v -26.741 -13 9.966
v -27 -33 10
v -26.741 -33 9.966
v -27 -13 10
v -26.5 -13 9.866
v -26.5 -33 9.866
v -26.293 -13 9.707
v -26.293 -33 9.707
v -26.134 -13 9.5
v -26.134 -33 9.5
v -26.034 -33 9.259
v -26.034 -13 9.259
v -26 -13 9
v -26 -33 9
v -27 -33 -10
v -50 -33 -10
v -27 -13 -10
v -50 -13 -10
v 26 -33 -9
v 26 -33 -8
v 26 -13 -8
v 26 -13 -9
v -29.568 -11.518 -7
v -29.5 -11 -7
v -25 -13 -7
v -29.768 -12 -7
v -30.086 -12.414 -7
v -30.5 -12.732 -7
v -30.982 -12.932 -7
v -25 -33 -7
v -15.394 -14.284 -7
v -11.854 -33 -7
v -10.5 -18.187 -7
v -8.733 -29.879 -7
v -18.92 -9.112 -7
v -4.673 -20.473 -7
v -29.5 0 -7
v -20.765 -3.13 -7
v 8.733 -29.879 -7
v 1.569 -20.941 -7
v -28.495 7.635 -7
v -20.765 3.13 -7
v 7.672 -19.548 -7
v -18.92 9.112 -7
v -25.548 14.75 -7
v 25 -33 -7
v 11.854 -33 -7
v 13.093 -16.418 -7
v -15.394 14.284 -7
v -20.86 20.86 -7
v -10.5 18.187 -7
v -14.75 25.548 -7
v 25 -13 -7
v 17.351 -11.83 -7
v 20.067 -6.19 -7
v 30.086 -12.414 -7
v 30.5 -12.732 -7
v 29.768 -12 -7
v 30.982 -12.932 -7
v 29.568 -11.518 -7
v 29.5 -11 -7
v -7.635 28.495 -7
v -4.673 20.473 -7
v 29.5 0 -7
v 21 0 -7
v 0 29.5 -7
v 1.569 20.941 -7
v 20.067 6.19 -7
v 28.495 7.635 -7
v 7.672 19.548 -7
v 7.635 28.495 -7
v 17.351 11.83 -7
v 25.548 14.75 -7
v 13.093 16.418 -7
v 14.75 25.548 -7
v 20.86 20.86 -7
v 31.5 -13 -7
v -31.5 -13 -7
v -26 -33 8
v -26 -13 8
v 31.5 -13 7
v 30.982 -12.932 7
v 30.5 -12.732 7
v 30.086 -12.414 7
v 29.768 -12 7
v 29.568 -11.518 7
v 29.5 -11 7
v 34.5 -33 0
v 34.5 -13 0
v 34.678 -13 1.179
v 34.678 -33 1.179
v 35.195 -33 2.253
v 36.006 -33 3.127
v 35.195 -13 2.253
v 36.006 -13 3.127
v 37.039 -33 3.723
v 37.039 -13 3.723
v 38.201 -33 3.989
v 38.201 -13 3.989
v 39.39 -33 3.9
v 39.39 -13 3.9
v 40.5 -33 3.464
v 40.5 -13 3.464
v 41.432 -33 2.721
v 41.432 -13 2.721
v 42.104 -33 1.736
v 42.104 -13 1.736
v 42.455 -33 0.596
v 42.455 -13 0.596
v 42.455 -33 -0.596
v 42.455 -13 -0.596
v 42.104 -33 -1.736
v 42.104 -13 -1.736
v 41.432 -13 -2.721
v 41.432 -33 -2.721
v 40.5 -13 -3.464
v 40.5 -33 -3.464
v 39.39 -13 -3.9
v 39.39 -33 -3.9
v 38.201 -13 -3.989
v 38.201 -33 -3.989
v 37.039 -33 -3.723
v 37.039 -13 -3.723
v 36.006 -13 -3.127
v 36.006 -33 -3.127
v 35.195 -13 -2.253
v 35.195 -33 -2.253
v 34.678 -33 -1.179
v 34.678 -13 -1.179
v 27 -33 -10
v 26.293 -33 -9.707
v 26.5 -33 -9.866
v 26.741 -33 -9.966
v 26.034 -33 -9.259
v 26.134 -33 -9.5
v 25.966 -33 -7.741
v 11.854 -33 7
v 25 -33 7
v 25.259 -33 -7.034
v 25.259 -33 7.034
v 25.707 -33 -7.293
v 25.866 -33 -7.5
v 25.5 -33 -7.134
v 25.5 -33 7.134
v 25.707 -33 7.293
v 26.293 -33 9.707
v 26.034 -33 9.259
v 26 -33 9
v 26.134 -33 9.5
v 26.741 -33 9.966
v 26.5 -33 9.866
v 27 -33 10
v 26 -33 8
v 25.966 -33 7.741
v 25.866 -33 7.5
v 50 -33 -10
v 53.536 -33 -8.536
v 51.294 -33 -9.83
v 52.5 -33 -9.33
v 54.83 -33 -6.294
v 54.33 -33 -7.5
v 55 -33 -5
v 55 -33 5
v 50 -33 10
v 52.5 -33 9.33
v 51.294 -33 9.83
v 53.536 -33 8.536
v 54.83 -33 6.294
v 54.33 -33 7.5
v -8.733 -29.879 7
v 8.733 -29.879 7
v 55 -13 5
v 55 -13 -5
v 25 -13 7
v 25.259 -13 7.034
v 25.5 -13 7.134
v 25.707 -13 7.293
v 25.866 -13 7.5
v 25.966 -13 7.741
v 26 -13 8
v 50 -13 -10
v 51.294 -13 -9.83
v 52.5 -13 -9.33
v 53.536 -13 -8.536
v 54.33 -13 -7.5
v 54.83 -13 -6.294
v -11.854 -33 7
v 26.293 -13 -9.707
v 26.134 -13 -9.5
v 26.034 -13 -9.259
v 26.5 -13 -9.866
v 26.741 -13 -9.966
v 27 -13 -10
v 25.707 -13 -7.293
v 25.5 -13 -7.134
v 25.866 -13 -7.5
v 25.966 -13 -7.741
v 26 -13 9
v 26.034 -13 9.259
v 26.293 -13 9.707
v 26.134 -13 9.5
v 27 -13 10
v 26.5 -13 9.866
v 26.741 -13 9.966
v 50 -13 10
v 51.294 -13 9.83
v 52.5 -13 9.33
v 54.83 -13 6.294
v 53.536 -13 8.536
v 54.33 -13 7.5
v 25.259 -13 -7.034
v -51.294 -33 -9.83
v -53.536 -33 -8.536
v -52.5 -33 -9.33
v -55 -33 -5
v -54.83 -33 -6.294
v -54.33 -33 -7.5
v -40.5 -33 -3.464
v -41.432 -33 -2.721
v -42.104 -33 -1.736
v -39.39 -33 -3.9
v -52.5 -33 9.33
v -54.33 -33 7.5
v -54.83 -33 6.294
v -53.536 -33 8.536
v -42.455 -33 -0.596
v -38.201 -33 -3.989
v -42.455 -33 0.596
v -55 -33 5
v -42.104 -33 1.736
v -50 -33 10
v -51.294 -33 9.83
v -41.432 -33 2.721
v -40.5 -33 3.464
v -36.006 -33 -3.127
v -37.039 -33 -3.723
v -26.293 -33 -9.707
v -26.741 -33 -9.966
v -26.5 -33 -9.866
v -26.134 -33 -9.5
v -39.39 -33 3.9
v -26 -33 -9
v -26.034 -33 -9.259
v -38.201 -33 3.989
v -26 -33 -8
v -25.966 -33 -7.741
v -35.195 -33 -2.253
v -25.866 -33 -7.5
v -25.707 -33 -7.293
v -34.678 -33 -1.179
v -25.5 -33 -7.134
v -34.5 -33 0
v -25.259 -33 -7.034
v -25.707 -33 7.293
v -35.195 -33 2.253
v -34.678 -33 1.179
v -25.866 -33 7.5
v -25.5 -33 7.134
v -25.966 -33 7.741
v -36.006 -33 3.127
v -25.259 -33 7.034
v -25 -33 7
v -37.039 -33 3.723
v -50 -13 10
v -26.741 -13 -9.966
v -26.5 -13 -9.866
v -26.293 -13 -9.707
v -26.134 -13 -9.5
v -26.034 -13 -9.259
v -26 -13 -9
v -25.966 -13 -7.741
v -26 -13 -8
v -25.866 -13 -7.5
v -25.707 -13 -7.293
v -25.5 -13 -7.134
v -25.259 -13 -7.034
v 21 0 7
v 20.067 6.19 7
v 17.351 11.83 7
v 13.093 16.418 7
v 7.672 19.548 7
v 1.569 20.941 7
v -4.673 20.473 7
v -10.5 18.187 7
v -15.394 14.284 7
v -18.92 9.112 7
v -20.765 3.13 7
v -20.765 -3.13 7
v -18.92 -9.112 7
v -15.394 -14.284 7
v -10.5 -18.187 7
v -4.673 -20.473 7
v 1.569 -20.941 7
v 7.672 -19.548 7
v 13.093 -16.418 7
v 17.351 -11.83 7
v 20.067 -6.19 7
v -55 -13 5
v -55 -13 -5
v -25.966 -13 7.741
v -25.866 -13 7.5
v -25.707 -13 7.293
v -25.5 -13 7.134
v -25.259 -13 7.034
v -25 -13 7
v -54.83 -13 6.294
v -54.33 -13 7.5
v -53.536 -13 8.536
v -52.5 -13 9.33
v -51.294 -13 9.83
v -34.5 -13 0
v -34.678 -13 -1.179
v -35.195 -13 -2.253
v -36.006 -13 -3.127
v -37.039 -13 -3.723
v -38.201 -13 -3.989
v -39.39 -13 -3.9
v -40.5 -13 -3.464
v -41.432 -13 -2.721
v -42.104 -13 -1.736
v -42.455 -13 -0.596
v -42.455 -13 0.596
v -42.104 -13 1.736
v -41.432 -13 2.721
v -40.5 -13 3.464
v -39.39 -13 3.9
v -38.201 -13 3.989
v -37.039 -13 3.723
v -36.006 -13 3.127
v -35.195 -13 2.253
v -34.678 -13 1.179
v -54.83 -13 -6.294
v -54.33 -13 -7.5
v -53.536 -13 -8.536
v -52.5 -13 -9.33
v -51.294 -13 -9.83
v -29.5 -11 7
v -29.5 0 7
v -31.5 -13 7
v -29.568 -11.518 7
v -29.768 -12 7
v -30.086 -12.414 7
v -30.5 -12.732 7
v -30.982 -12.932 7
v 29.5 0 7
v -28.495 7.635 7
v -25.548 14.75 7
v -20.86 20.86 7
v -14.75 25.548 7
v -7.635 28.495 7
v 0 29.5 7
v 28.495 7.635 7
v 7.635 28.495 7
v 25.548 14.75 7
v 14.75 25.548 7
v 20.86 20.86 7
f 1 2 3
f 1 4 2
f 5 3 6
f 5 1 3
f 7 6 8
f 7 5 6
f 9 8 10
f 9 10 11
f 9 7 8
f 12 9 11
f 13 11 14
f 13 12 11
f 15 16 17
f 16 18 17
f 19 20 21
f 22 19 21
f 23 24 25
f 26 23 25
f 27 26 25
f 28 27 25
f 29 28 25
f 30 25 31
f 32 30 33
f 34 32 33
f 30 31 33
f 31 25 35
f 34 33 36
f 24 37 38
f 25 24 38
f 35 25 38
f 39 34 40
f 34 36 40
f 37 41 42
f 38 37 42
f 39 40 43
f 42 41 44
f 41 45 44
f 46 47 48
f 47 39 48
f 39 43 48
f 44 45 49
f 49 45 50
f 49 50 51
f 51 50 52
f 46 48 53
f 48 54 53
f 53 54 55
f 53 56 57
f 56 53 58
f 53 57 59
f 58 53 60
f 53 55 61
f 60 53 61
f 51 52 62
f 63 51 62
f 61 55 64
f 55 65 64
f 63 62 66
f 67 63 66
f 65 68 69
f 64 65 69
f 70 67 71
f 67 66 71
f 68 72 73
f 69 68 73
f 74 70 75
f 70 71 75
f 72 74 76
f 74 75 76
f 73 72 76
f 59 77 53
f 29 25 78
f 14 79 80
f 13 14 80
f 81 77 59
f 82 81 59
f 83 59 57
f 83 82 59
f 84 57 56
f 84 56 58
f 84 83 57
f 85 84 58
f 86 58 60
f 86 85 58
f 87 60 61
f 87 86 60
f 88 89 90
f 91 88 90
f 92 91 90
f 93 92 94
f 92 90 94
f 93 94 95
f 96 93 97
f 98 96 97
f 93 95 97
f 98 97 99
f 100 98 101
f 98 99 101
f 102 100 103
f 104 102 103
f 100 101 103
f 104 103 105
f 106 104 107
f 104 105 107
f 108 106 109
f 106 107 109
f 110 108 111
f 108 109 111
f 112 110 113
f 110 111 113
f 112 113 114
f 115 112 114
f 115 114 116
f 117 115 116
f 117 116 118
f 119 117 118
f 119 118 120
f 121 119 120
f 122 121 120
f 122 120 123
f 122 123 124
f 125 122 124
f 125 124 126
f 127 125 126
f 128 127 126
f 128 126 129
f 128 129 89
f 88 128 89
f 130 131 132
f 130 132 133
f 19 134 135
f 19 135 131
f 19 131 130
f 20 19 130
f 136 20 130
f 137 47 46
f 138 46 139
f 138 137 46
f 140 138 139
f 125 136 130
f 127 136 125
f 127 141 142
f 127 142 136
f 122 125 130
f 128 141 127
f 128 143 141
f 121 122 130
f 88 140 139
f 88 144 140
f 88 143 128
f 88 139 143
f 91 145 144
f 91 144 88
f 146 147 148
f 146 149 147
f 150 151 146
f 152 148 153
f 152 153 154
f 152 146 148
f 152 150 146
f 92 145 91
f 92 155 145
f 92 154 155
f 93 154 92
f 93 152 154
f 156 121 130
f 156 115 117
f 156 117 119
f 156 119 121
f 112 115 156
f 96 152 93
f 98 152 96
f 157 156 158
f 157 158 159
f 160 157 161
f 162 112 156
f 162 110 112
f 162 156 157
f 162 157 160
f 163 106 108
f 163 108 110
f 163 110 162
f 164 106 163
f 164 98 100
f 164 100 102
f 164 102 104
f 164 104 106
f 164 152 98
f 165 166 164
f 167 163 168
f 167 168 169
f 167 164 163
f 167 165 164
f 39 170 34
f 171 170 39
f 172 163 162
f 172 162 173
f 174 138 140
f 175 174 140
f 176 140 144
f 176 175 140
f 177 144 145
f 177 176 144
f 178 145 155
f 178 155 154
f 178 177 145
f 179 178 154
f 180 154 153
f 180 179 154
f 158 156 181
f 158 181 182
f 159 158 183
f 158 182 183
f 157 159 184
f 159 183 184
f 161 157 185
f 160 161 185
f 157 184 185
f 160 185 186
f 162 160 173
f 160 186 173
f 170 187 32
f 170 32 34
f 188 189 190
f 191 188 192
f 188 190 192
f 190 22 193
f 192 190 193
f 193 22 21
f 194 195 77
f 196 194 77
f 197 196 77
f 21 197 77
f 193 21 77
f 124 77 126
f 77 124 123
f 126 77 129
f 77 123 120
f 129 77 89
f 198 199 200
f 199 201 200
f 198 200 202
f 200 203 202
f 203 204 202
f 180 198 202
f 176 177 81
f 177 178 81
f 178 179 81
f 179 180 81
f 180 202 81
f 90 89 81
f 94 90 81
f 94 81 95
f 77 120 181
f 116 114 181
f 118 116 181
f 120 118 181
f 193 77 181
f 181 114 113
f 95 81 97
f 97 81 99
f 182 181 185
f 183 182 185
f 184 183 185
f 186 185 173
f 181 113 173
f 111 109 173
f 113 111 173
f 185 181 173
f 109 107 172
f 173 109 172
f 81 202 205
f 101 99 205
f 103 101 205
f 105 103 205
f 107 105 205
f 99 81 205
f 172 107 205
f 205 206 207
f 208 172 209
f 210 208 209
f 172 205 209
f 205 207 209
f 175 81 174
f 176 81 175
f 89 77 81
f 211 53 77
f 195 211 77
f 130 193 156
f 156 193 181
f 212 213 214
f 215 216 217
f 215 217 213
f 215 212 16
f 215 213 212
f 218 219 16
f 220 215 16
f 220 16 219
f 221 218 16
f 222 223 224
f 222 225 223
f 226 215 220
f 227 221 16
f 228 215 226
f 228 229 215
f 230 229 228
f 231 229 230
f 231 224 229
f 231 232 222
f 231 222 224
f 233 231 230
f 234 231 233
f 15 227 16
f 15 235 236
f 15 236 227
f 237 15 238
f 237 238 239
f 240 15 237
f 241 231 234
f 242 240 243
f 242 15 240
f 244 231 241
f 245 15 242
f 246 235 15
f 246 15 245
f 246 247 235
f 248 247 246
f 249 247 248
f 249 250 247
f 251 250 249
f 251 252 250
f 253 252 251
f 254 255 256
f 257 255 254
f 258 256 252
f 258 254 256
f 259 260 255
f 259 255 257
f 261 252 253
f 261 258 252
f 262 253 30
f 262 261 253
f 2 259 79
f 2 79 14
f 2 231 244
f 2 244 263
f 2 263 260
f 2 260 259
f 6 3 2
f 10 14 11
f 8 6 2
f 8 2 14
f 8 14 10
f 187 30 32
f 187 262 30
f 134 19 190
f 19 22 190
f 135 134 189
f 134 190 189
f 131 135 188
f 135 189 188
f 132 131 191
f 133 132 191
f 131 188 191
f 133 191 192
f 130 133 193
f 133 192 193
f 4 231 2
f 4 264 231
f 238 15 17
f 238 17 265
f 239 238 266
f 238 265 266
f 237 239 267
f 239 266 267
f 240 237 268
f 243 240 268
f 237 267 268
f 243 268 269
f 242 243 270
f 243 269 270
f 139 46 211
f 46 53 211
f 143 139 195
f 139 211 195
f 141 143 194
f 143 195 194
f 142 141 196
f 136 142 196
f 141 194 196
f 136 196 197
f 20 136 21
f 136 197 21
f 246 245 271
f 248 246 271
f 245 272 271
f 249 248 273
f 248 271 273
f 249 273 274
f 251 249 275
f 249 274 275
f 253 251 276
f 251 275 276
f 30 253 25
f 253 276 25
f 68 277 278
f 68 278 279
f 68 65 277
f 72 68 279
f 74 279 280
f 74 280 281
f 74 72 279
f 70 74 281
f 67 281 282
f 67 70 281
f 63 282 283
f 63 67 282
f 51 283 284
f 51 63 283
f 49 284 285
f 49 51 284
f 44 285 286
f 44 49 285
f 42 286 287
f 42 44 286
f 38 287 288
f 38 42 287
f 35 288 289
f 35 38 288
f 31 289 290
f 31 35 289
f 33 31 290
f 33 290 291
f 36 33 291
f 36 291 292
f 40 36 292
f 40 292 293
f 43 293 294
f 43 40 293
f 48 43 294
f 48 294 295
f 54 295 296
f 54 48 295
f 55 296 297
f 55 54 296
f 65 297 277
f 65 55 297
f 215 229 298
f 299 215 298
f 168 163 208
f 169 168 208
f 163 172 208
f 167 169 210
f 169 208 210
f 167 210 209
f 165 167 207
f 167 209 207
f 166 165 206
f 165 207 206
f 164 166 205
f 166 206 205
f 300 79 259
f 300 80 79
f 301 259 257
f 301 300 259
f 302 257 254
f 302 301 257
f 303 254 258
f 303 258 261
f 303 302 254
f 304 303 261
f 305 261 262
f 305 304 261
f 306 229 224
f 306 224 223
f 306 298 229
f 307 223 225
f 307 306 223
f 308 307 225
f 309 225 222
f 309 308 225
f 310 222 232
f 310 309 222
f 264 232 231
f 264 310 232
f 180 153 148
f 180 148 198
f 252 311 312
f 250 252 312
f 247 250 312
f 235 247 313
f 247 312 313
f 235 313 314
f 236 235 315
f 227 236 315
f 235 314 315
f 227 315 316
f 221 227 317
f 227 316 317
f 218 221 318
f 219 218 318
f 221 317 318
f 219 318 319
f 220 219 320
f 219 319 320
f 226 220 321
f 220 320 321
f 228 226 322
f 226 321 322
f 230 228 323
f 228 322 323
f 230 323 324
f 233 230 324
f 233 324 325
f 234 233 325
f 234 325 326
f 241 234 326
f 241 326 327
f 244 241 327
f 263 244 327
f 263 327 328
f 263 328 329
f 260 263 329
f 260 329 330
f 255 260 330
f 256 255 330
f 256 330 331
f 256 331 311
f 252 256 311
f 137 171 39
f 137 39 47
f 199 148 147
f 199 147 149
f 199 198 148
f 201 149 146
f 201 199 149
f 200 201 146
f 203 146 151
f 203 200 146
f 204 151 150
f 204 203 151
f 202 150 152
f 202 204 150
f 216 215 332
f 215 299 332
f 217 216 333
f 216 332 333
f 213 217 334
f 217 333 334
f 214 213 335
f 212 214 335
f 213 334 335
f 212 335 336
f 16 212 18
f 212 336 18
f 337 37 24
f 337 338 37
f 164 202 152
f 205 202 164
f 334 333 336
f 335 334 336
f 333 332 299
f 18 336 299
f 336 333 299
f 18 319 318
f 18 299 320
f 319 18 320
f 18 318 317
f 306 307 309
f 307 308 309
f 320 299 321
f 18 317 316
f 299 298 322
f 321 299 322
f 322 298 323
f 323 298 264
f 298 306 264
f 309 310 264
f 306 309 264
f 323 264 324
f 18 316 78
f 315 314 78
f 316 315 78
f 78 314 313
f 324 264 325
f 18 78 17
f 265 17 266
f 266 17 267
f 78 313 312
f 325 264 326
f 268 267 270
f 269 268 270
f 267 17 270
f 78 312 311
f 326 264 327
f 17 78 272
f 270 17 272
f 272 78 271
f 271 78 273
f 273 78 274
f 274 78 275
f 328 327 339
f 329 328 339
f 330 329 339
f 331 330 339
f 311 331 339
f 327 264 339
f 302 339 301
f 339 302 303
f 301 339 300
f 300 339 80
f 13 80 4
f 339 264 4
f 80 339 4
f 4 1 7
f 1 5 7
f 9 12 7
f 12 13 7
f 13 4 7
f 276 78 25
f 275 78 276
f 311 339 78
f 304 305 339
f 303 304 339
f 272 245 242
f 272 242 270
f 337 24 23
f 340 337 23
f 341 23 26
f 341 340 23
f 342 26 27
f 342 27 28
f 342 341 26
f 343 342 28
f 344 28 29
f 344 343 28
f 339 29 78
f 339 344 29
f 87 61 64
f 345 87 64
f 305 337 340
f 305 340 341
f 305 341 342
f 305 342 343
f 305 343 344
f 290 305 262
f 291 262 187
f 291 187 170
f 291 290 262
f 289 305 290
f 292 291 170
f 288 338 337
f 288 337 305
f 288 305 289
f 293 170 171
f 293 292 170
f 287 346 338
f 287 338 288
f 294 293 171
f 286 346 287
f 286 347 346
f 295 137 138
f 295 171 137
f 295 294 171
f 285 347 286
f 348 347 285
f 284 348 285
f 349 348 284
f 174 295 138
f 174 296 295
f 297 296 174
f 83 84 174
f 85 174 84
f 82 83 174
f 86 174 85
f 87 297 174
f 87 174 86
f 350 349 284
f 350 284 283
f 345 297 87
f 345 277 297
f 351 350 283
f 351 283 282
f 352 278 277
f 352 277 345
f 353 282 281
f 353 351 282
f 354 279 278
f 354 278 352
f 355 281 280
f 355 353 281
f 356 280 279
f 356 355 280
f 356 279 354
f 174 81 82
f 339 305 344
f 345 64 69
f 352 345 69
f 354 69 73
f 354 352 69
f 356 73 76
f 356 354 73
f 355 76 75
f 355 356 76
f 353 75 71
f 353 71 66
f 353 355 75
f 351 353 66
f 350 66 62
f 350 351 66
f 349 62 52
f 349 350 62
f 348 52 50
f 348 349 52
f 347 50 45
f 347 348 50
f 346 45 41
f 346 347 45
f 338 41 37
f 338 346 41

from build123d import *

# Parameters (mm, degrees)
SKETCH1_R           = 21
BOSS_EXTRUDE1_DEPTH = 7
SKETCH2_W           = 29
SKETCH2_H           = 20
BOSS_EXTRUDE2_DEPTH = 3
CUT_EXTRUDE1_DEPTH  = 67.355105305
FILLET1_R           = 5
FILLET2_R           = 1
SKETCH4_R           = 4
CUT_EXTRUDE2_DEPTH  = 71.222859526


with BuildPart() as part:
    # Sketch1 → Boss-Extrude1 (new, symmetric)
    with BuildSketch(Plane.XY):
        with BuildLine():
            Line((-29.5, 0), (-29.5, -11))
            ThreePointArc((-29.5, -11), (-30.085786438, -12.414213562), (-31.5, -13))
            Line((-31.5, -13), (-55, -13))
            Line((-55, -13), (-55, -33))
            Line((-55, -33), (55, -33))
            Line((55, -33), (55, -13))
            Line((55, -13), (31.5, -13))
            ThreePointArc((31.5, -13), (30.085786438, -12.414213562), (29.5, -11))
            Line((29.5, -11), (29.5, 0))
            ThreePointArc((29.5, 0), (0, 29.5), (-29.5, 0))
        make_face()
        Circle(SKETCH1_R, mode=Mode.SUBTRACT)
    extrude(amount=BOSS_EXTRUDE1_DEPTH, both=True)

    # Sketch2 → Boss-Extrude2 (add)
    with BuildSketch(Plane.XY.offset(7)):
        with Locations((-40.5, -23)):
            Rectangle(SKETCH2_W, SKETCH2_H)
        with Locations((40.5, -23)):
            Rectangle(SKETCH2_W, SKETCH2_H)
    boss_extrude2 = extrude(amount=BOSS_EXTRUDE2_DEPTH)

    # Mirror1: Boss-Extrude2 across plane
    add(boss_extrude2.mirror(Plane.XY))

    # Sketch3 → Cut-Extrude1 (cut, through all)
    with BuildSketch(Plane.XY.offset(7)):
        Polygon((-11.85382749, -33), (-8.732636014, -29.878808524), (8.732636014, -29.878808524), (11.85382749, -33), align=None)
    extrude(amount=-CUT_EXTRUDE1_DEPTH, mode=Mode.SUBTRACT)

    # Fillet1
    fillet1_edges = [part.edges().sort_by_distance(p)[0] for p in [
        (-55, -23, 10),
        (55, -23, 10),
        (-55, -23, -10),
        (55, -23, -10),
    ]]
    fillet(fillet1_edges, radius=FILLET1_R)

    # Fillet2
    fillet2_edges = [part.edges().sort_by_distance(p)[0] for p in [
        (-26, -23, 7),
        (-26, -23, 10),
        (26, -23, 7),
        (26, -23, 10),
        (-26, -23, -10),
        (-26, -23, -7),
        (26, -23, -10),
        (26, -23, -7),
    ]]
    fillet(fillet2_edges, radius=FILLET2_R)

    # Sketch4 → Cut-Extrude2 (cut, through all)
    with BuildSketch(Plane(origin=(0, -13, 0), x_dir=(1, 0, 0), z_dir=(0, 1, 0))):
        with Locations(Location((38.5, 0, 0), (0, 0, 180))):
            Circle(SKETCH4_R)
        with Locations((-38.5, 0)):
            Circle(SKETCH4_R)
    extrude(amount=-CUT_EXTRUDE2_DEPTH, mode=Mode.SUBTRACT)


solid = part.part
